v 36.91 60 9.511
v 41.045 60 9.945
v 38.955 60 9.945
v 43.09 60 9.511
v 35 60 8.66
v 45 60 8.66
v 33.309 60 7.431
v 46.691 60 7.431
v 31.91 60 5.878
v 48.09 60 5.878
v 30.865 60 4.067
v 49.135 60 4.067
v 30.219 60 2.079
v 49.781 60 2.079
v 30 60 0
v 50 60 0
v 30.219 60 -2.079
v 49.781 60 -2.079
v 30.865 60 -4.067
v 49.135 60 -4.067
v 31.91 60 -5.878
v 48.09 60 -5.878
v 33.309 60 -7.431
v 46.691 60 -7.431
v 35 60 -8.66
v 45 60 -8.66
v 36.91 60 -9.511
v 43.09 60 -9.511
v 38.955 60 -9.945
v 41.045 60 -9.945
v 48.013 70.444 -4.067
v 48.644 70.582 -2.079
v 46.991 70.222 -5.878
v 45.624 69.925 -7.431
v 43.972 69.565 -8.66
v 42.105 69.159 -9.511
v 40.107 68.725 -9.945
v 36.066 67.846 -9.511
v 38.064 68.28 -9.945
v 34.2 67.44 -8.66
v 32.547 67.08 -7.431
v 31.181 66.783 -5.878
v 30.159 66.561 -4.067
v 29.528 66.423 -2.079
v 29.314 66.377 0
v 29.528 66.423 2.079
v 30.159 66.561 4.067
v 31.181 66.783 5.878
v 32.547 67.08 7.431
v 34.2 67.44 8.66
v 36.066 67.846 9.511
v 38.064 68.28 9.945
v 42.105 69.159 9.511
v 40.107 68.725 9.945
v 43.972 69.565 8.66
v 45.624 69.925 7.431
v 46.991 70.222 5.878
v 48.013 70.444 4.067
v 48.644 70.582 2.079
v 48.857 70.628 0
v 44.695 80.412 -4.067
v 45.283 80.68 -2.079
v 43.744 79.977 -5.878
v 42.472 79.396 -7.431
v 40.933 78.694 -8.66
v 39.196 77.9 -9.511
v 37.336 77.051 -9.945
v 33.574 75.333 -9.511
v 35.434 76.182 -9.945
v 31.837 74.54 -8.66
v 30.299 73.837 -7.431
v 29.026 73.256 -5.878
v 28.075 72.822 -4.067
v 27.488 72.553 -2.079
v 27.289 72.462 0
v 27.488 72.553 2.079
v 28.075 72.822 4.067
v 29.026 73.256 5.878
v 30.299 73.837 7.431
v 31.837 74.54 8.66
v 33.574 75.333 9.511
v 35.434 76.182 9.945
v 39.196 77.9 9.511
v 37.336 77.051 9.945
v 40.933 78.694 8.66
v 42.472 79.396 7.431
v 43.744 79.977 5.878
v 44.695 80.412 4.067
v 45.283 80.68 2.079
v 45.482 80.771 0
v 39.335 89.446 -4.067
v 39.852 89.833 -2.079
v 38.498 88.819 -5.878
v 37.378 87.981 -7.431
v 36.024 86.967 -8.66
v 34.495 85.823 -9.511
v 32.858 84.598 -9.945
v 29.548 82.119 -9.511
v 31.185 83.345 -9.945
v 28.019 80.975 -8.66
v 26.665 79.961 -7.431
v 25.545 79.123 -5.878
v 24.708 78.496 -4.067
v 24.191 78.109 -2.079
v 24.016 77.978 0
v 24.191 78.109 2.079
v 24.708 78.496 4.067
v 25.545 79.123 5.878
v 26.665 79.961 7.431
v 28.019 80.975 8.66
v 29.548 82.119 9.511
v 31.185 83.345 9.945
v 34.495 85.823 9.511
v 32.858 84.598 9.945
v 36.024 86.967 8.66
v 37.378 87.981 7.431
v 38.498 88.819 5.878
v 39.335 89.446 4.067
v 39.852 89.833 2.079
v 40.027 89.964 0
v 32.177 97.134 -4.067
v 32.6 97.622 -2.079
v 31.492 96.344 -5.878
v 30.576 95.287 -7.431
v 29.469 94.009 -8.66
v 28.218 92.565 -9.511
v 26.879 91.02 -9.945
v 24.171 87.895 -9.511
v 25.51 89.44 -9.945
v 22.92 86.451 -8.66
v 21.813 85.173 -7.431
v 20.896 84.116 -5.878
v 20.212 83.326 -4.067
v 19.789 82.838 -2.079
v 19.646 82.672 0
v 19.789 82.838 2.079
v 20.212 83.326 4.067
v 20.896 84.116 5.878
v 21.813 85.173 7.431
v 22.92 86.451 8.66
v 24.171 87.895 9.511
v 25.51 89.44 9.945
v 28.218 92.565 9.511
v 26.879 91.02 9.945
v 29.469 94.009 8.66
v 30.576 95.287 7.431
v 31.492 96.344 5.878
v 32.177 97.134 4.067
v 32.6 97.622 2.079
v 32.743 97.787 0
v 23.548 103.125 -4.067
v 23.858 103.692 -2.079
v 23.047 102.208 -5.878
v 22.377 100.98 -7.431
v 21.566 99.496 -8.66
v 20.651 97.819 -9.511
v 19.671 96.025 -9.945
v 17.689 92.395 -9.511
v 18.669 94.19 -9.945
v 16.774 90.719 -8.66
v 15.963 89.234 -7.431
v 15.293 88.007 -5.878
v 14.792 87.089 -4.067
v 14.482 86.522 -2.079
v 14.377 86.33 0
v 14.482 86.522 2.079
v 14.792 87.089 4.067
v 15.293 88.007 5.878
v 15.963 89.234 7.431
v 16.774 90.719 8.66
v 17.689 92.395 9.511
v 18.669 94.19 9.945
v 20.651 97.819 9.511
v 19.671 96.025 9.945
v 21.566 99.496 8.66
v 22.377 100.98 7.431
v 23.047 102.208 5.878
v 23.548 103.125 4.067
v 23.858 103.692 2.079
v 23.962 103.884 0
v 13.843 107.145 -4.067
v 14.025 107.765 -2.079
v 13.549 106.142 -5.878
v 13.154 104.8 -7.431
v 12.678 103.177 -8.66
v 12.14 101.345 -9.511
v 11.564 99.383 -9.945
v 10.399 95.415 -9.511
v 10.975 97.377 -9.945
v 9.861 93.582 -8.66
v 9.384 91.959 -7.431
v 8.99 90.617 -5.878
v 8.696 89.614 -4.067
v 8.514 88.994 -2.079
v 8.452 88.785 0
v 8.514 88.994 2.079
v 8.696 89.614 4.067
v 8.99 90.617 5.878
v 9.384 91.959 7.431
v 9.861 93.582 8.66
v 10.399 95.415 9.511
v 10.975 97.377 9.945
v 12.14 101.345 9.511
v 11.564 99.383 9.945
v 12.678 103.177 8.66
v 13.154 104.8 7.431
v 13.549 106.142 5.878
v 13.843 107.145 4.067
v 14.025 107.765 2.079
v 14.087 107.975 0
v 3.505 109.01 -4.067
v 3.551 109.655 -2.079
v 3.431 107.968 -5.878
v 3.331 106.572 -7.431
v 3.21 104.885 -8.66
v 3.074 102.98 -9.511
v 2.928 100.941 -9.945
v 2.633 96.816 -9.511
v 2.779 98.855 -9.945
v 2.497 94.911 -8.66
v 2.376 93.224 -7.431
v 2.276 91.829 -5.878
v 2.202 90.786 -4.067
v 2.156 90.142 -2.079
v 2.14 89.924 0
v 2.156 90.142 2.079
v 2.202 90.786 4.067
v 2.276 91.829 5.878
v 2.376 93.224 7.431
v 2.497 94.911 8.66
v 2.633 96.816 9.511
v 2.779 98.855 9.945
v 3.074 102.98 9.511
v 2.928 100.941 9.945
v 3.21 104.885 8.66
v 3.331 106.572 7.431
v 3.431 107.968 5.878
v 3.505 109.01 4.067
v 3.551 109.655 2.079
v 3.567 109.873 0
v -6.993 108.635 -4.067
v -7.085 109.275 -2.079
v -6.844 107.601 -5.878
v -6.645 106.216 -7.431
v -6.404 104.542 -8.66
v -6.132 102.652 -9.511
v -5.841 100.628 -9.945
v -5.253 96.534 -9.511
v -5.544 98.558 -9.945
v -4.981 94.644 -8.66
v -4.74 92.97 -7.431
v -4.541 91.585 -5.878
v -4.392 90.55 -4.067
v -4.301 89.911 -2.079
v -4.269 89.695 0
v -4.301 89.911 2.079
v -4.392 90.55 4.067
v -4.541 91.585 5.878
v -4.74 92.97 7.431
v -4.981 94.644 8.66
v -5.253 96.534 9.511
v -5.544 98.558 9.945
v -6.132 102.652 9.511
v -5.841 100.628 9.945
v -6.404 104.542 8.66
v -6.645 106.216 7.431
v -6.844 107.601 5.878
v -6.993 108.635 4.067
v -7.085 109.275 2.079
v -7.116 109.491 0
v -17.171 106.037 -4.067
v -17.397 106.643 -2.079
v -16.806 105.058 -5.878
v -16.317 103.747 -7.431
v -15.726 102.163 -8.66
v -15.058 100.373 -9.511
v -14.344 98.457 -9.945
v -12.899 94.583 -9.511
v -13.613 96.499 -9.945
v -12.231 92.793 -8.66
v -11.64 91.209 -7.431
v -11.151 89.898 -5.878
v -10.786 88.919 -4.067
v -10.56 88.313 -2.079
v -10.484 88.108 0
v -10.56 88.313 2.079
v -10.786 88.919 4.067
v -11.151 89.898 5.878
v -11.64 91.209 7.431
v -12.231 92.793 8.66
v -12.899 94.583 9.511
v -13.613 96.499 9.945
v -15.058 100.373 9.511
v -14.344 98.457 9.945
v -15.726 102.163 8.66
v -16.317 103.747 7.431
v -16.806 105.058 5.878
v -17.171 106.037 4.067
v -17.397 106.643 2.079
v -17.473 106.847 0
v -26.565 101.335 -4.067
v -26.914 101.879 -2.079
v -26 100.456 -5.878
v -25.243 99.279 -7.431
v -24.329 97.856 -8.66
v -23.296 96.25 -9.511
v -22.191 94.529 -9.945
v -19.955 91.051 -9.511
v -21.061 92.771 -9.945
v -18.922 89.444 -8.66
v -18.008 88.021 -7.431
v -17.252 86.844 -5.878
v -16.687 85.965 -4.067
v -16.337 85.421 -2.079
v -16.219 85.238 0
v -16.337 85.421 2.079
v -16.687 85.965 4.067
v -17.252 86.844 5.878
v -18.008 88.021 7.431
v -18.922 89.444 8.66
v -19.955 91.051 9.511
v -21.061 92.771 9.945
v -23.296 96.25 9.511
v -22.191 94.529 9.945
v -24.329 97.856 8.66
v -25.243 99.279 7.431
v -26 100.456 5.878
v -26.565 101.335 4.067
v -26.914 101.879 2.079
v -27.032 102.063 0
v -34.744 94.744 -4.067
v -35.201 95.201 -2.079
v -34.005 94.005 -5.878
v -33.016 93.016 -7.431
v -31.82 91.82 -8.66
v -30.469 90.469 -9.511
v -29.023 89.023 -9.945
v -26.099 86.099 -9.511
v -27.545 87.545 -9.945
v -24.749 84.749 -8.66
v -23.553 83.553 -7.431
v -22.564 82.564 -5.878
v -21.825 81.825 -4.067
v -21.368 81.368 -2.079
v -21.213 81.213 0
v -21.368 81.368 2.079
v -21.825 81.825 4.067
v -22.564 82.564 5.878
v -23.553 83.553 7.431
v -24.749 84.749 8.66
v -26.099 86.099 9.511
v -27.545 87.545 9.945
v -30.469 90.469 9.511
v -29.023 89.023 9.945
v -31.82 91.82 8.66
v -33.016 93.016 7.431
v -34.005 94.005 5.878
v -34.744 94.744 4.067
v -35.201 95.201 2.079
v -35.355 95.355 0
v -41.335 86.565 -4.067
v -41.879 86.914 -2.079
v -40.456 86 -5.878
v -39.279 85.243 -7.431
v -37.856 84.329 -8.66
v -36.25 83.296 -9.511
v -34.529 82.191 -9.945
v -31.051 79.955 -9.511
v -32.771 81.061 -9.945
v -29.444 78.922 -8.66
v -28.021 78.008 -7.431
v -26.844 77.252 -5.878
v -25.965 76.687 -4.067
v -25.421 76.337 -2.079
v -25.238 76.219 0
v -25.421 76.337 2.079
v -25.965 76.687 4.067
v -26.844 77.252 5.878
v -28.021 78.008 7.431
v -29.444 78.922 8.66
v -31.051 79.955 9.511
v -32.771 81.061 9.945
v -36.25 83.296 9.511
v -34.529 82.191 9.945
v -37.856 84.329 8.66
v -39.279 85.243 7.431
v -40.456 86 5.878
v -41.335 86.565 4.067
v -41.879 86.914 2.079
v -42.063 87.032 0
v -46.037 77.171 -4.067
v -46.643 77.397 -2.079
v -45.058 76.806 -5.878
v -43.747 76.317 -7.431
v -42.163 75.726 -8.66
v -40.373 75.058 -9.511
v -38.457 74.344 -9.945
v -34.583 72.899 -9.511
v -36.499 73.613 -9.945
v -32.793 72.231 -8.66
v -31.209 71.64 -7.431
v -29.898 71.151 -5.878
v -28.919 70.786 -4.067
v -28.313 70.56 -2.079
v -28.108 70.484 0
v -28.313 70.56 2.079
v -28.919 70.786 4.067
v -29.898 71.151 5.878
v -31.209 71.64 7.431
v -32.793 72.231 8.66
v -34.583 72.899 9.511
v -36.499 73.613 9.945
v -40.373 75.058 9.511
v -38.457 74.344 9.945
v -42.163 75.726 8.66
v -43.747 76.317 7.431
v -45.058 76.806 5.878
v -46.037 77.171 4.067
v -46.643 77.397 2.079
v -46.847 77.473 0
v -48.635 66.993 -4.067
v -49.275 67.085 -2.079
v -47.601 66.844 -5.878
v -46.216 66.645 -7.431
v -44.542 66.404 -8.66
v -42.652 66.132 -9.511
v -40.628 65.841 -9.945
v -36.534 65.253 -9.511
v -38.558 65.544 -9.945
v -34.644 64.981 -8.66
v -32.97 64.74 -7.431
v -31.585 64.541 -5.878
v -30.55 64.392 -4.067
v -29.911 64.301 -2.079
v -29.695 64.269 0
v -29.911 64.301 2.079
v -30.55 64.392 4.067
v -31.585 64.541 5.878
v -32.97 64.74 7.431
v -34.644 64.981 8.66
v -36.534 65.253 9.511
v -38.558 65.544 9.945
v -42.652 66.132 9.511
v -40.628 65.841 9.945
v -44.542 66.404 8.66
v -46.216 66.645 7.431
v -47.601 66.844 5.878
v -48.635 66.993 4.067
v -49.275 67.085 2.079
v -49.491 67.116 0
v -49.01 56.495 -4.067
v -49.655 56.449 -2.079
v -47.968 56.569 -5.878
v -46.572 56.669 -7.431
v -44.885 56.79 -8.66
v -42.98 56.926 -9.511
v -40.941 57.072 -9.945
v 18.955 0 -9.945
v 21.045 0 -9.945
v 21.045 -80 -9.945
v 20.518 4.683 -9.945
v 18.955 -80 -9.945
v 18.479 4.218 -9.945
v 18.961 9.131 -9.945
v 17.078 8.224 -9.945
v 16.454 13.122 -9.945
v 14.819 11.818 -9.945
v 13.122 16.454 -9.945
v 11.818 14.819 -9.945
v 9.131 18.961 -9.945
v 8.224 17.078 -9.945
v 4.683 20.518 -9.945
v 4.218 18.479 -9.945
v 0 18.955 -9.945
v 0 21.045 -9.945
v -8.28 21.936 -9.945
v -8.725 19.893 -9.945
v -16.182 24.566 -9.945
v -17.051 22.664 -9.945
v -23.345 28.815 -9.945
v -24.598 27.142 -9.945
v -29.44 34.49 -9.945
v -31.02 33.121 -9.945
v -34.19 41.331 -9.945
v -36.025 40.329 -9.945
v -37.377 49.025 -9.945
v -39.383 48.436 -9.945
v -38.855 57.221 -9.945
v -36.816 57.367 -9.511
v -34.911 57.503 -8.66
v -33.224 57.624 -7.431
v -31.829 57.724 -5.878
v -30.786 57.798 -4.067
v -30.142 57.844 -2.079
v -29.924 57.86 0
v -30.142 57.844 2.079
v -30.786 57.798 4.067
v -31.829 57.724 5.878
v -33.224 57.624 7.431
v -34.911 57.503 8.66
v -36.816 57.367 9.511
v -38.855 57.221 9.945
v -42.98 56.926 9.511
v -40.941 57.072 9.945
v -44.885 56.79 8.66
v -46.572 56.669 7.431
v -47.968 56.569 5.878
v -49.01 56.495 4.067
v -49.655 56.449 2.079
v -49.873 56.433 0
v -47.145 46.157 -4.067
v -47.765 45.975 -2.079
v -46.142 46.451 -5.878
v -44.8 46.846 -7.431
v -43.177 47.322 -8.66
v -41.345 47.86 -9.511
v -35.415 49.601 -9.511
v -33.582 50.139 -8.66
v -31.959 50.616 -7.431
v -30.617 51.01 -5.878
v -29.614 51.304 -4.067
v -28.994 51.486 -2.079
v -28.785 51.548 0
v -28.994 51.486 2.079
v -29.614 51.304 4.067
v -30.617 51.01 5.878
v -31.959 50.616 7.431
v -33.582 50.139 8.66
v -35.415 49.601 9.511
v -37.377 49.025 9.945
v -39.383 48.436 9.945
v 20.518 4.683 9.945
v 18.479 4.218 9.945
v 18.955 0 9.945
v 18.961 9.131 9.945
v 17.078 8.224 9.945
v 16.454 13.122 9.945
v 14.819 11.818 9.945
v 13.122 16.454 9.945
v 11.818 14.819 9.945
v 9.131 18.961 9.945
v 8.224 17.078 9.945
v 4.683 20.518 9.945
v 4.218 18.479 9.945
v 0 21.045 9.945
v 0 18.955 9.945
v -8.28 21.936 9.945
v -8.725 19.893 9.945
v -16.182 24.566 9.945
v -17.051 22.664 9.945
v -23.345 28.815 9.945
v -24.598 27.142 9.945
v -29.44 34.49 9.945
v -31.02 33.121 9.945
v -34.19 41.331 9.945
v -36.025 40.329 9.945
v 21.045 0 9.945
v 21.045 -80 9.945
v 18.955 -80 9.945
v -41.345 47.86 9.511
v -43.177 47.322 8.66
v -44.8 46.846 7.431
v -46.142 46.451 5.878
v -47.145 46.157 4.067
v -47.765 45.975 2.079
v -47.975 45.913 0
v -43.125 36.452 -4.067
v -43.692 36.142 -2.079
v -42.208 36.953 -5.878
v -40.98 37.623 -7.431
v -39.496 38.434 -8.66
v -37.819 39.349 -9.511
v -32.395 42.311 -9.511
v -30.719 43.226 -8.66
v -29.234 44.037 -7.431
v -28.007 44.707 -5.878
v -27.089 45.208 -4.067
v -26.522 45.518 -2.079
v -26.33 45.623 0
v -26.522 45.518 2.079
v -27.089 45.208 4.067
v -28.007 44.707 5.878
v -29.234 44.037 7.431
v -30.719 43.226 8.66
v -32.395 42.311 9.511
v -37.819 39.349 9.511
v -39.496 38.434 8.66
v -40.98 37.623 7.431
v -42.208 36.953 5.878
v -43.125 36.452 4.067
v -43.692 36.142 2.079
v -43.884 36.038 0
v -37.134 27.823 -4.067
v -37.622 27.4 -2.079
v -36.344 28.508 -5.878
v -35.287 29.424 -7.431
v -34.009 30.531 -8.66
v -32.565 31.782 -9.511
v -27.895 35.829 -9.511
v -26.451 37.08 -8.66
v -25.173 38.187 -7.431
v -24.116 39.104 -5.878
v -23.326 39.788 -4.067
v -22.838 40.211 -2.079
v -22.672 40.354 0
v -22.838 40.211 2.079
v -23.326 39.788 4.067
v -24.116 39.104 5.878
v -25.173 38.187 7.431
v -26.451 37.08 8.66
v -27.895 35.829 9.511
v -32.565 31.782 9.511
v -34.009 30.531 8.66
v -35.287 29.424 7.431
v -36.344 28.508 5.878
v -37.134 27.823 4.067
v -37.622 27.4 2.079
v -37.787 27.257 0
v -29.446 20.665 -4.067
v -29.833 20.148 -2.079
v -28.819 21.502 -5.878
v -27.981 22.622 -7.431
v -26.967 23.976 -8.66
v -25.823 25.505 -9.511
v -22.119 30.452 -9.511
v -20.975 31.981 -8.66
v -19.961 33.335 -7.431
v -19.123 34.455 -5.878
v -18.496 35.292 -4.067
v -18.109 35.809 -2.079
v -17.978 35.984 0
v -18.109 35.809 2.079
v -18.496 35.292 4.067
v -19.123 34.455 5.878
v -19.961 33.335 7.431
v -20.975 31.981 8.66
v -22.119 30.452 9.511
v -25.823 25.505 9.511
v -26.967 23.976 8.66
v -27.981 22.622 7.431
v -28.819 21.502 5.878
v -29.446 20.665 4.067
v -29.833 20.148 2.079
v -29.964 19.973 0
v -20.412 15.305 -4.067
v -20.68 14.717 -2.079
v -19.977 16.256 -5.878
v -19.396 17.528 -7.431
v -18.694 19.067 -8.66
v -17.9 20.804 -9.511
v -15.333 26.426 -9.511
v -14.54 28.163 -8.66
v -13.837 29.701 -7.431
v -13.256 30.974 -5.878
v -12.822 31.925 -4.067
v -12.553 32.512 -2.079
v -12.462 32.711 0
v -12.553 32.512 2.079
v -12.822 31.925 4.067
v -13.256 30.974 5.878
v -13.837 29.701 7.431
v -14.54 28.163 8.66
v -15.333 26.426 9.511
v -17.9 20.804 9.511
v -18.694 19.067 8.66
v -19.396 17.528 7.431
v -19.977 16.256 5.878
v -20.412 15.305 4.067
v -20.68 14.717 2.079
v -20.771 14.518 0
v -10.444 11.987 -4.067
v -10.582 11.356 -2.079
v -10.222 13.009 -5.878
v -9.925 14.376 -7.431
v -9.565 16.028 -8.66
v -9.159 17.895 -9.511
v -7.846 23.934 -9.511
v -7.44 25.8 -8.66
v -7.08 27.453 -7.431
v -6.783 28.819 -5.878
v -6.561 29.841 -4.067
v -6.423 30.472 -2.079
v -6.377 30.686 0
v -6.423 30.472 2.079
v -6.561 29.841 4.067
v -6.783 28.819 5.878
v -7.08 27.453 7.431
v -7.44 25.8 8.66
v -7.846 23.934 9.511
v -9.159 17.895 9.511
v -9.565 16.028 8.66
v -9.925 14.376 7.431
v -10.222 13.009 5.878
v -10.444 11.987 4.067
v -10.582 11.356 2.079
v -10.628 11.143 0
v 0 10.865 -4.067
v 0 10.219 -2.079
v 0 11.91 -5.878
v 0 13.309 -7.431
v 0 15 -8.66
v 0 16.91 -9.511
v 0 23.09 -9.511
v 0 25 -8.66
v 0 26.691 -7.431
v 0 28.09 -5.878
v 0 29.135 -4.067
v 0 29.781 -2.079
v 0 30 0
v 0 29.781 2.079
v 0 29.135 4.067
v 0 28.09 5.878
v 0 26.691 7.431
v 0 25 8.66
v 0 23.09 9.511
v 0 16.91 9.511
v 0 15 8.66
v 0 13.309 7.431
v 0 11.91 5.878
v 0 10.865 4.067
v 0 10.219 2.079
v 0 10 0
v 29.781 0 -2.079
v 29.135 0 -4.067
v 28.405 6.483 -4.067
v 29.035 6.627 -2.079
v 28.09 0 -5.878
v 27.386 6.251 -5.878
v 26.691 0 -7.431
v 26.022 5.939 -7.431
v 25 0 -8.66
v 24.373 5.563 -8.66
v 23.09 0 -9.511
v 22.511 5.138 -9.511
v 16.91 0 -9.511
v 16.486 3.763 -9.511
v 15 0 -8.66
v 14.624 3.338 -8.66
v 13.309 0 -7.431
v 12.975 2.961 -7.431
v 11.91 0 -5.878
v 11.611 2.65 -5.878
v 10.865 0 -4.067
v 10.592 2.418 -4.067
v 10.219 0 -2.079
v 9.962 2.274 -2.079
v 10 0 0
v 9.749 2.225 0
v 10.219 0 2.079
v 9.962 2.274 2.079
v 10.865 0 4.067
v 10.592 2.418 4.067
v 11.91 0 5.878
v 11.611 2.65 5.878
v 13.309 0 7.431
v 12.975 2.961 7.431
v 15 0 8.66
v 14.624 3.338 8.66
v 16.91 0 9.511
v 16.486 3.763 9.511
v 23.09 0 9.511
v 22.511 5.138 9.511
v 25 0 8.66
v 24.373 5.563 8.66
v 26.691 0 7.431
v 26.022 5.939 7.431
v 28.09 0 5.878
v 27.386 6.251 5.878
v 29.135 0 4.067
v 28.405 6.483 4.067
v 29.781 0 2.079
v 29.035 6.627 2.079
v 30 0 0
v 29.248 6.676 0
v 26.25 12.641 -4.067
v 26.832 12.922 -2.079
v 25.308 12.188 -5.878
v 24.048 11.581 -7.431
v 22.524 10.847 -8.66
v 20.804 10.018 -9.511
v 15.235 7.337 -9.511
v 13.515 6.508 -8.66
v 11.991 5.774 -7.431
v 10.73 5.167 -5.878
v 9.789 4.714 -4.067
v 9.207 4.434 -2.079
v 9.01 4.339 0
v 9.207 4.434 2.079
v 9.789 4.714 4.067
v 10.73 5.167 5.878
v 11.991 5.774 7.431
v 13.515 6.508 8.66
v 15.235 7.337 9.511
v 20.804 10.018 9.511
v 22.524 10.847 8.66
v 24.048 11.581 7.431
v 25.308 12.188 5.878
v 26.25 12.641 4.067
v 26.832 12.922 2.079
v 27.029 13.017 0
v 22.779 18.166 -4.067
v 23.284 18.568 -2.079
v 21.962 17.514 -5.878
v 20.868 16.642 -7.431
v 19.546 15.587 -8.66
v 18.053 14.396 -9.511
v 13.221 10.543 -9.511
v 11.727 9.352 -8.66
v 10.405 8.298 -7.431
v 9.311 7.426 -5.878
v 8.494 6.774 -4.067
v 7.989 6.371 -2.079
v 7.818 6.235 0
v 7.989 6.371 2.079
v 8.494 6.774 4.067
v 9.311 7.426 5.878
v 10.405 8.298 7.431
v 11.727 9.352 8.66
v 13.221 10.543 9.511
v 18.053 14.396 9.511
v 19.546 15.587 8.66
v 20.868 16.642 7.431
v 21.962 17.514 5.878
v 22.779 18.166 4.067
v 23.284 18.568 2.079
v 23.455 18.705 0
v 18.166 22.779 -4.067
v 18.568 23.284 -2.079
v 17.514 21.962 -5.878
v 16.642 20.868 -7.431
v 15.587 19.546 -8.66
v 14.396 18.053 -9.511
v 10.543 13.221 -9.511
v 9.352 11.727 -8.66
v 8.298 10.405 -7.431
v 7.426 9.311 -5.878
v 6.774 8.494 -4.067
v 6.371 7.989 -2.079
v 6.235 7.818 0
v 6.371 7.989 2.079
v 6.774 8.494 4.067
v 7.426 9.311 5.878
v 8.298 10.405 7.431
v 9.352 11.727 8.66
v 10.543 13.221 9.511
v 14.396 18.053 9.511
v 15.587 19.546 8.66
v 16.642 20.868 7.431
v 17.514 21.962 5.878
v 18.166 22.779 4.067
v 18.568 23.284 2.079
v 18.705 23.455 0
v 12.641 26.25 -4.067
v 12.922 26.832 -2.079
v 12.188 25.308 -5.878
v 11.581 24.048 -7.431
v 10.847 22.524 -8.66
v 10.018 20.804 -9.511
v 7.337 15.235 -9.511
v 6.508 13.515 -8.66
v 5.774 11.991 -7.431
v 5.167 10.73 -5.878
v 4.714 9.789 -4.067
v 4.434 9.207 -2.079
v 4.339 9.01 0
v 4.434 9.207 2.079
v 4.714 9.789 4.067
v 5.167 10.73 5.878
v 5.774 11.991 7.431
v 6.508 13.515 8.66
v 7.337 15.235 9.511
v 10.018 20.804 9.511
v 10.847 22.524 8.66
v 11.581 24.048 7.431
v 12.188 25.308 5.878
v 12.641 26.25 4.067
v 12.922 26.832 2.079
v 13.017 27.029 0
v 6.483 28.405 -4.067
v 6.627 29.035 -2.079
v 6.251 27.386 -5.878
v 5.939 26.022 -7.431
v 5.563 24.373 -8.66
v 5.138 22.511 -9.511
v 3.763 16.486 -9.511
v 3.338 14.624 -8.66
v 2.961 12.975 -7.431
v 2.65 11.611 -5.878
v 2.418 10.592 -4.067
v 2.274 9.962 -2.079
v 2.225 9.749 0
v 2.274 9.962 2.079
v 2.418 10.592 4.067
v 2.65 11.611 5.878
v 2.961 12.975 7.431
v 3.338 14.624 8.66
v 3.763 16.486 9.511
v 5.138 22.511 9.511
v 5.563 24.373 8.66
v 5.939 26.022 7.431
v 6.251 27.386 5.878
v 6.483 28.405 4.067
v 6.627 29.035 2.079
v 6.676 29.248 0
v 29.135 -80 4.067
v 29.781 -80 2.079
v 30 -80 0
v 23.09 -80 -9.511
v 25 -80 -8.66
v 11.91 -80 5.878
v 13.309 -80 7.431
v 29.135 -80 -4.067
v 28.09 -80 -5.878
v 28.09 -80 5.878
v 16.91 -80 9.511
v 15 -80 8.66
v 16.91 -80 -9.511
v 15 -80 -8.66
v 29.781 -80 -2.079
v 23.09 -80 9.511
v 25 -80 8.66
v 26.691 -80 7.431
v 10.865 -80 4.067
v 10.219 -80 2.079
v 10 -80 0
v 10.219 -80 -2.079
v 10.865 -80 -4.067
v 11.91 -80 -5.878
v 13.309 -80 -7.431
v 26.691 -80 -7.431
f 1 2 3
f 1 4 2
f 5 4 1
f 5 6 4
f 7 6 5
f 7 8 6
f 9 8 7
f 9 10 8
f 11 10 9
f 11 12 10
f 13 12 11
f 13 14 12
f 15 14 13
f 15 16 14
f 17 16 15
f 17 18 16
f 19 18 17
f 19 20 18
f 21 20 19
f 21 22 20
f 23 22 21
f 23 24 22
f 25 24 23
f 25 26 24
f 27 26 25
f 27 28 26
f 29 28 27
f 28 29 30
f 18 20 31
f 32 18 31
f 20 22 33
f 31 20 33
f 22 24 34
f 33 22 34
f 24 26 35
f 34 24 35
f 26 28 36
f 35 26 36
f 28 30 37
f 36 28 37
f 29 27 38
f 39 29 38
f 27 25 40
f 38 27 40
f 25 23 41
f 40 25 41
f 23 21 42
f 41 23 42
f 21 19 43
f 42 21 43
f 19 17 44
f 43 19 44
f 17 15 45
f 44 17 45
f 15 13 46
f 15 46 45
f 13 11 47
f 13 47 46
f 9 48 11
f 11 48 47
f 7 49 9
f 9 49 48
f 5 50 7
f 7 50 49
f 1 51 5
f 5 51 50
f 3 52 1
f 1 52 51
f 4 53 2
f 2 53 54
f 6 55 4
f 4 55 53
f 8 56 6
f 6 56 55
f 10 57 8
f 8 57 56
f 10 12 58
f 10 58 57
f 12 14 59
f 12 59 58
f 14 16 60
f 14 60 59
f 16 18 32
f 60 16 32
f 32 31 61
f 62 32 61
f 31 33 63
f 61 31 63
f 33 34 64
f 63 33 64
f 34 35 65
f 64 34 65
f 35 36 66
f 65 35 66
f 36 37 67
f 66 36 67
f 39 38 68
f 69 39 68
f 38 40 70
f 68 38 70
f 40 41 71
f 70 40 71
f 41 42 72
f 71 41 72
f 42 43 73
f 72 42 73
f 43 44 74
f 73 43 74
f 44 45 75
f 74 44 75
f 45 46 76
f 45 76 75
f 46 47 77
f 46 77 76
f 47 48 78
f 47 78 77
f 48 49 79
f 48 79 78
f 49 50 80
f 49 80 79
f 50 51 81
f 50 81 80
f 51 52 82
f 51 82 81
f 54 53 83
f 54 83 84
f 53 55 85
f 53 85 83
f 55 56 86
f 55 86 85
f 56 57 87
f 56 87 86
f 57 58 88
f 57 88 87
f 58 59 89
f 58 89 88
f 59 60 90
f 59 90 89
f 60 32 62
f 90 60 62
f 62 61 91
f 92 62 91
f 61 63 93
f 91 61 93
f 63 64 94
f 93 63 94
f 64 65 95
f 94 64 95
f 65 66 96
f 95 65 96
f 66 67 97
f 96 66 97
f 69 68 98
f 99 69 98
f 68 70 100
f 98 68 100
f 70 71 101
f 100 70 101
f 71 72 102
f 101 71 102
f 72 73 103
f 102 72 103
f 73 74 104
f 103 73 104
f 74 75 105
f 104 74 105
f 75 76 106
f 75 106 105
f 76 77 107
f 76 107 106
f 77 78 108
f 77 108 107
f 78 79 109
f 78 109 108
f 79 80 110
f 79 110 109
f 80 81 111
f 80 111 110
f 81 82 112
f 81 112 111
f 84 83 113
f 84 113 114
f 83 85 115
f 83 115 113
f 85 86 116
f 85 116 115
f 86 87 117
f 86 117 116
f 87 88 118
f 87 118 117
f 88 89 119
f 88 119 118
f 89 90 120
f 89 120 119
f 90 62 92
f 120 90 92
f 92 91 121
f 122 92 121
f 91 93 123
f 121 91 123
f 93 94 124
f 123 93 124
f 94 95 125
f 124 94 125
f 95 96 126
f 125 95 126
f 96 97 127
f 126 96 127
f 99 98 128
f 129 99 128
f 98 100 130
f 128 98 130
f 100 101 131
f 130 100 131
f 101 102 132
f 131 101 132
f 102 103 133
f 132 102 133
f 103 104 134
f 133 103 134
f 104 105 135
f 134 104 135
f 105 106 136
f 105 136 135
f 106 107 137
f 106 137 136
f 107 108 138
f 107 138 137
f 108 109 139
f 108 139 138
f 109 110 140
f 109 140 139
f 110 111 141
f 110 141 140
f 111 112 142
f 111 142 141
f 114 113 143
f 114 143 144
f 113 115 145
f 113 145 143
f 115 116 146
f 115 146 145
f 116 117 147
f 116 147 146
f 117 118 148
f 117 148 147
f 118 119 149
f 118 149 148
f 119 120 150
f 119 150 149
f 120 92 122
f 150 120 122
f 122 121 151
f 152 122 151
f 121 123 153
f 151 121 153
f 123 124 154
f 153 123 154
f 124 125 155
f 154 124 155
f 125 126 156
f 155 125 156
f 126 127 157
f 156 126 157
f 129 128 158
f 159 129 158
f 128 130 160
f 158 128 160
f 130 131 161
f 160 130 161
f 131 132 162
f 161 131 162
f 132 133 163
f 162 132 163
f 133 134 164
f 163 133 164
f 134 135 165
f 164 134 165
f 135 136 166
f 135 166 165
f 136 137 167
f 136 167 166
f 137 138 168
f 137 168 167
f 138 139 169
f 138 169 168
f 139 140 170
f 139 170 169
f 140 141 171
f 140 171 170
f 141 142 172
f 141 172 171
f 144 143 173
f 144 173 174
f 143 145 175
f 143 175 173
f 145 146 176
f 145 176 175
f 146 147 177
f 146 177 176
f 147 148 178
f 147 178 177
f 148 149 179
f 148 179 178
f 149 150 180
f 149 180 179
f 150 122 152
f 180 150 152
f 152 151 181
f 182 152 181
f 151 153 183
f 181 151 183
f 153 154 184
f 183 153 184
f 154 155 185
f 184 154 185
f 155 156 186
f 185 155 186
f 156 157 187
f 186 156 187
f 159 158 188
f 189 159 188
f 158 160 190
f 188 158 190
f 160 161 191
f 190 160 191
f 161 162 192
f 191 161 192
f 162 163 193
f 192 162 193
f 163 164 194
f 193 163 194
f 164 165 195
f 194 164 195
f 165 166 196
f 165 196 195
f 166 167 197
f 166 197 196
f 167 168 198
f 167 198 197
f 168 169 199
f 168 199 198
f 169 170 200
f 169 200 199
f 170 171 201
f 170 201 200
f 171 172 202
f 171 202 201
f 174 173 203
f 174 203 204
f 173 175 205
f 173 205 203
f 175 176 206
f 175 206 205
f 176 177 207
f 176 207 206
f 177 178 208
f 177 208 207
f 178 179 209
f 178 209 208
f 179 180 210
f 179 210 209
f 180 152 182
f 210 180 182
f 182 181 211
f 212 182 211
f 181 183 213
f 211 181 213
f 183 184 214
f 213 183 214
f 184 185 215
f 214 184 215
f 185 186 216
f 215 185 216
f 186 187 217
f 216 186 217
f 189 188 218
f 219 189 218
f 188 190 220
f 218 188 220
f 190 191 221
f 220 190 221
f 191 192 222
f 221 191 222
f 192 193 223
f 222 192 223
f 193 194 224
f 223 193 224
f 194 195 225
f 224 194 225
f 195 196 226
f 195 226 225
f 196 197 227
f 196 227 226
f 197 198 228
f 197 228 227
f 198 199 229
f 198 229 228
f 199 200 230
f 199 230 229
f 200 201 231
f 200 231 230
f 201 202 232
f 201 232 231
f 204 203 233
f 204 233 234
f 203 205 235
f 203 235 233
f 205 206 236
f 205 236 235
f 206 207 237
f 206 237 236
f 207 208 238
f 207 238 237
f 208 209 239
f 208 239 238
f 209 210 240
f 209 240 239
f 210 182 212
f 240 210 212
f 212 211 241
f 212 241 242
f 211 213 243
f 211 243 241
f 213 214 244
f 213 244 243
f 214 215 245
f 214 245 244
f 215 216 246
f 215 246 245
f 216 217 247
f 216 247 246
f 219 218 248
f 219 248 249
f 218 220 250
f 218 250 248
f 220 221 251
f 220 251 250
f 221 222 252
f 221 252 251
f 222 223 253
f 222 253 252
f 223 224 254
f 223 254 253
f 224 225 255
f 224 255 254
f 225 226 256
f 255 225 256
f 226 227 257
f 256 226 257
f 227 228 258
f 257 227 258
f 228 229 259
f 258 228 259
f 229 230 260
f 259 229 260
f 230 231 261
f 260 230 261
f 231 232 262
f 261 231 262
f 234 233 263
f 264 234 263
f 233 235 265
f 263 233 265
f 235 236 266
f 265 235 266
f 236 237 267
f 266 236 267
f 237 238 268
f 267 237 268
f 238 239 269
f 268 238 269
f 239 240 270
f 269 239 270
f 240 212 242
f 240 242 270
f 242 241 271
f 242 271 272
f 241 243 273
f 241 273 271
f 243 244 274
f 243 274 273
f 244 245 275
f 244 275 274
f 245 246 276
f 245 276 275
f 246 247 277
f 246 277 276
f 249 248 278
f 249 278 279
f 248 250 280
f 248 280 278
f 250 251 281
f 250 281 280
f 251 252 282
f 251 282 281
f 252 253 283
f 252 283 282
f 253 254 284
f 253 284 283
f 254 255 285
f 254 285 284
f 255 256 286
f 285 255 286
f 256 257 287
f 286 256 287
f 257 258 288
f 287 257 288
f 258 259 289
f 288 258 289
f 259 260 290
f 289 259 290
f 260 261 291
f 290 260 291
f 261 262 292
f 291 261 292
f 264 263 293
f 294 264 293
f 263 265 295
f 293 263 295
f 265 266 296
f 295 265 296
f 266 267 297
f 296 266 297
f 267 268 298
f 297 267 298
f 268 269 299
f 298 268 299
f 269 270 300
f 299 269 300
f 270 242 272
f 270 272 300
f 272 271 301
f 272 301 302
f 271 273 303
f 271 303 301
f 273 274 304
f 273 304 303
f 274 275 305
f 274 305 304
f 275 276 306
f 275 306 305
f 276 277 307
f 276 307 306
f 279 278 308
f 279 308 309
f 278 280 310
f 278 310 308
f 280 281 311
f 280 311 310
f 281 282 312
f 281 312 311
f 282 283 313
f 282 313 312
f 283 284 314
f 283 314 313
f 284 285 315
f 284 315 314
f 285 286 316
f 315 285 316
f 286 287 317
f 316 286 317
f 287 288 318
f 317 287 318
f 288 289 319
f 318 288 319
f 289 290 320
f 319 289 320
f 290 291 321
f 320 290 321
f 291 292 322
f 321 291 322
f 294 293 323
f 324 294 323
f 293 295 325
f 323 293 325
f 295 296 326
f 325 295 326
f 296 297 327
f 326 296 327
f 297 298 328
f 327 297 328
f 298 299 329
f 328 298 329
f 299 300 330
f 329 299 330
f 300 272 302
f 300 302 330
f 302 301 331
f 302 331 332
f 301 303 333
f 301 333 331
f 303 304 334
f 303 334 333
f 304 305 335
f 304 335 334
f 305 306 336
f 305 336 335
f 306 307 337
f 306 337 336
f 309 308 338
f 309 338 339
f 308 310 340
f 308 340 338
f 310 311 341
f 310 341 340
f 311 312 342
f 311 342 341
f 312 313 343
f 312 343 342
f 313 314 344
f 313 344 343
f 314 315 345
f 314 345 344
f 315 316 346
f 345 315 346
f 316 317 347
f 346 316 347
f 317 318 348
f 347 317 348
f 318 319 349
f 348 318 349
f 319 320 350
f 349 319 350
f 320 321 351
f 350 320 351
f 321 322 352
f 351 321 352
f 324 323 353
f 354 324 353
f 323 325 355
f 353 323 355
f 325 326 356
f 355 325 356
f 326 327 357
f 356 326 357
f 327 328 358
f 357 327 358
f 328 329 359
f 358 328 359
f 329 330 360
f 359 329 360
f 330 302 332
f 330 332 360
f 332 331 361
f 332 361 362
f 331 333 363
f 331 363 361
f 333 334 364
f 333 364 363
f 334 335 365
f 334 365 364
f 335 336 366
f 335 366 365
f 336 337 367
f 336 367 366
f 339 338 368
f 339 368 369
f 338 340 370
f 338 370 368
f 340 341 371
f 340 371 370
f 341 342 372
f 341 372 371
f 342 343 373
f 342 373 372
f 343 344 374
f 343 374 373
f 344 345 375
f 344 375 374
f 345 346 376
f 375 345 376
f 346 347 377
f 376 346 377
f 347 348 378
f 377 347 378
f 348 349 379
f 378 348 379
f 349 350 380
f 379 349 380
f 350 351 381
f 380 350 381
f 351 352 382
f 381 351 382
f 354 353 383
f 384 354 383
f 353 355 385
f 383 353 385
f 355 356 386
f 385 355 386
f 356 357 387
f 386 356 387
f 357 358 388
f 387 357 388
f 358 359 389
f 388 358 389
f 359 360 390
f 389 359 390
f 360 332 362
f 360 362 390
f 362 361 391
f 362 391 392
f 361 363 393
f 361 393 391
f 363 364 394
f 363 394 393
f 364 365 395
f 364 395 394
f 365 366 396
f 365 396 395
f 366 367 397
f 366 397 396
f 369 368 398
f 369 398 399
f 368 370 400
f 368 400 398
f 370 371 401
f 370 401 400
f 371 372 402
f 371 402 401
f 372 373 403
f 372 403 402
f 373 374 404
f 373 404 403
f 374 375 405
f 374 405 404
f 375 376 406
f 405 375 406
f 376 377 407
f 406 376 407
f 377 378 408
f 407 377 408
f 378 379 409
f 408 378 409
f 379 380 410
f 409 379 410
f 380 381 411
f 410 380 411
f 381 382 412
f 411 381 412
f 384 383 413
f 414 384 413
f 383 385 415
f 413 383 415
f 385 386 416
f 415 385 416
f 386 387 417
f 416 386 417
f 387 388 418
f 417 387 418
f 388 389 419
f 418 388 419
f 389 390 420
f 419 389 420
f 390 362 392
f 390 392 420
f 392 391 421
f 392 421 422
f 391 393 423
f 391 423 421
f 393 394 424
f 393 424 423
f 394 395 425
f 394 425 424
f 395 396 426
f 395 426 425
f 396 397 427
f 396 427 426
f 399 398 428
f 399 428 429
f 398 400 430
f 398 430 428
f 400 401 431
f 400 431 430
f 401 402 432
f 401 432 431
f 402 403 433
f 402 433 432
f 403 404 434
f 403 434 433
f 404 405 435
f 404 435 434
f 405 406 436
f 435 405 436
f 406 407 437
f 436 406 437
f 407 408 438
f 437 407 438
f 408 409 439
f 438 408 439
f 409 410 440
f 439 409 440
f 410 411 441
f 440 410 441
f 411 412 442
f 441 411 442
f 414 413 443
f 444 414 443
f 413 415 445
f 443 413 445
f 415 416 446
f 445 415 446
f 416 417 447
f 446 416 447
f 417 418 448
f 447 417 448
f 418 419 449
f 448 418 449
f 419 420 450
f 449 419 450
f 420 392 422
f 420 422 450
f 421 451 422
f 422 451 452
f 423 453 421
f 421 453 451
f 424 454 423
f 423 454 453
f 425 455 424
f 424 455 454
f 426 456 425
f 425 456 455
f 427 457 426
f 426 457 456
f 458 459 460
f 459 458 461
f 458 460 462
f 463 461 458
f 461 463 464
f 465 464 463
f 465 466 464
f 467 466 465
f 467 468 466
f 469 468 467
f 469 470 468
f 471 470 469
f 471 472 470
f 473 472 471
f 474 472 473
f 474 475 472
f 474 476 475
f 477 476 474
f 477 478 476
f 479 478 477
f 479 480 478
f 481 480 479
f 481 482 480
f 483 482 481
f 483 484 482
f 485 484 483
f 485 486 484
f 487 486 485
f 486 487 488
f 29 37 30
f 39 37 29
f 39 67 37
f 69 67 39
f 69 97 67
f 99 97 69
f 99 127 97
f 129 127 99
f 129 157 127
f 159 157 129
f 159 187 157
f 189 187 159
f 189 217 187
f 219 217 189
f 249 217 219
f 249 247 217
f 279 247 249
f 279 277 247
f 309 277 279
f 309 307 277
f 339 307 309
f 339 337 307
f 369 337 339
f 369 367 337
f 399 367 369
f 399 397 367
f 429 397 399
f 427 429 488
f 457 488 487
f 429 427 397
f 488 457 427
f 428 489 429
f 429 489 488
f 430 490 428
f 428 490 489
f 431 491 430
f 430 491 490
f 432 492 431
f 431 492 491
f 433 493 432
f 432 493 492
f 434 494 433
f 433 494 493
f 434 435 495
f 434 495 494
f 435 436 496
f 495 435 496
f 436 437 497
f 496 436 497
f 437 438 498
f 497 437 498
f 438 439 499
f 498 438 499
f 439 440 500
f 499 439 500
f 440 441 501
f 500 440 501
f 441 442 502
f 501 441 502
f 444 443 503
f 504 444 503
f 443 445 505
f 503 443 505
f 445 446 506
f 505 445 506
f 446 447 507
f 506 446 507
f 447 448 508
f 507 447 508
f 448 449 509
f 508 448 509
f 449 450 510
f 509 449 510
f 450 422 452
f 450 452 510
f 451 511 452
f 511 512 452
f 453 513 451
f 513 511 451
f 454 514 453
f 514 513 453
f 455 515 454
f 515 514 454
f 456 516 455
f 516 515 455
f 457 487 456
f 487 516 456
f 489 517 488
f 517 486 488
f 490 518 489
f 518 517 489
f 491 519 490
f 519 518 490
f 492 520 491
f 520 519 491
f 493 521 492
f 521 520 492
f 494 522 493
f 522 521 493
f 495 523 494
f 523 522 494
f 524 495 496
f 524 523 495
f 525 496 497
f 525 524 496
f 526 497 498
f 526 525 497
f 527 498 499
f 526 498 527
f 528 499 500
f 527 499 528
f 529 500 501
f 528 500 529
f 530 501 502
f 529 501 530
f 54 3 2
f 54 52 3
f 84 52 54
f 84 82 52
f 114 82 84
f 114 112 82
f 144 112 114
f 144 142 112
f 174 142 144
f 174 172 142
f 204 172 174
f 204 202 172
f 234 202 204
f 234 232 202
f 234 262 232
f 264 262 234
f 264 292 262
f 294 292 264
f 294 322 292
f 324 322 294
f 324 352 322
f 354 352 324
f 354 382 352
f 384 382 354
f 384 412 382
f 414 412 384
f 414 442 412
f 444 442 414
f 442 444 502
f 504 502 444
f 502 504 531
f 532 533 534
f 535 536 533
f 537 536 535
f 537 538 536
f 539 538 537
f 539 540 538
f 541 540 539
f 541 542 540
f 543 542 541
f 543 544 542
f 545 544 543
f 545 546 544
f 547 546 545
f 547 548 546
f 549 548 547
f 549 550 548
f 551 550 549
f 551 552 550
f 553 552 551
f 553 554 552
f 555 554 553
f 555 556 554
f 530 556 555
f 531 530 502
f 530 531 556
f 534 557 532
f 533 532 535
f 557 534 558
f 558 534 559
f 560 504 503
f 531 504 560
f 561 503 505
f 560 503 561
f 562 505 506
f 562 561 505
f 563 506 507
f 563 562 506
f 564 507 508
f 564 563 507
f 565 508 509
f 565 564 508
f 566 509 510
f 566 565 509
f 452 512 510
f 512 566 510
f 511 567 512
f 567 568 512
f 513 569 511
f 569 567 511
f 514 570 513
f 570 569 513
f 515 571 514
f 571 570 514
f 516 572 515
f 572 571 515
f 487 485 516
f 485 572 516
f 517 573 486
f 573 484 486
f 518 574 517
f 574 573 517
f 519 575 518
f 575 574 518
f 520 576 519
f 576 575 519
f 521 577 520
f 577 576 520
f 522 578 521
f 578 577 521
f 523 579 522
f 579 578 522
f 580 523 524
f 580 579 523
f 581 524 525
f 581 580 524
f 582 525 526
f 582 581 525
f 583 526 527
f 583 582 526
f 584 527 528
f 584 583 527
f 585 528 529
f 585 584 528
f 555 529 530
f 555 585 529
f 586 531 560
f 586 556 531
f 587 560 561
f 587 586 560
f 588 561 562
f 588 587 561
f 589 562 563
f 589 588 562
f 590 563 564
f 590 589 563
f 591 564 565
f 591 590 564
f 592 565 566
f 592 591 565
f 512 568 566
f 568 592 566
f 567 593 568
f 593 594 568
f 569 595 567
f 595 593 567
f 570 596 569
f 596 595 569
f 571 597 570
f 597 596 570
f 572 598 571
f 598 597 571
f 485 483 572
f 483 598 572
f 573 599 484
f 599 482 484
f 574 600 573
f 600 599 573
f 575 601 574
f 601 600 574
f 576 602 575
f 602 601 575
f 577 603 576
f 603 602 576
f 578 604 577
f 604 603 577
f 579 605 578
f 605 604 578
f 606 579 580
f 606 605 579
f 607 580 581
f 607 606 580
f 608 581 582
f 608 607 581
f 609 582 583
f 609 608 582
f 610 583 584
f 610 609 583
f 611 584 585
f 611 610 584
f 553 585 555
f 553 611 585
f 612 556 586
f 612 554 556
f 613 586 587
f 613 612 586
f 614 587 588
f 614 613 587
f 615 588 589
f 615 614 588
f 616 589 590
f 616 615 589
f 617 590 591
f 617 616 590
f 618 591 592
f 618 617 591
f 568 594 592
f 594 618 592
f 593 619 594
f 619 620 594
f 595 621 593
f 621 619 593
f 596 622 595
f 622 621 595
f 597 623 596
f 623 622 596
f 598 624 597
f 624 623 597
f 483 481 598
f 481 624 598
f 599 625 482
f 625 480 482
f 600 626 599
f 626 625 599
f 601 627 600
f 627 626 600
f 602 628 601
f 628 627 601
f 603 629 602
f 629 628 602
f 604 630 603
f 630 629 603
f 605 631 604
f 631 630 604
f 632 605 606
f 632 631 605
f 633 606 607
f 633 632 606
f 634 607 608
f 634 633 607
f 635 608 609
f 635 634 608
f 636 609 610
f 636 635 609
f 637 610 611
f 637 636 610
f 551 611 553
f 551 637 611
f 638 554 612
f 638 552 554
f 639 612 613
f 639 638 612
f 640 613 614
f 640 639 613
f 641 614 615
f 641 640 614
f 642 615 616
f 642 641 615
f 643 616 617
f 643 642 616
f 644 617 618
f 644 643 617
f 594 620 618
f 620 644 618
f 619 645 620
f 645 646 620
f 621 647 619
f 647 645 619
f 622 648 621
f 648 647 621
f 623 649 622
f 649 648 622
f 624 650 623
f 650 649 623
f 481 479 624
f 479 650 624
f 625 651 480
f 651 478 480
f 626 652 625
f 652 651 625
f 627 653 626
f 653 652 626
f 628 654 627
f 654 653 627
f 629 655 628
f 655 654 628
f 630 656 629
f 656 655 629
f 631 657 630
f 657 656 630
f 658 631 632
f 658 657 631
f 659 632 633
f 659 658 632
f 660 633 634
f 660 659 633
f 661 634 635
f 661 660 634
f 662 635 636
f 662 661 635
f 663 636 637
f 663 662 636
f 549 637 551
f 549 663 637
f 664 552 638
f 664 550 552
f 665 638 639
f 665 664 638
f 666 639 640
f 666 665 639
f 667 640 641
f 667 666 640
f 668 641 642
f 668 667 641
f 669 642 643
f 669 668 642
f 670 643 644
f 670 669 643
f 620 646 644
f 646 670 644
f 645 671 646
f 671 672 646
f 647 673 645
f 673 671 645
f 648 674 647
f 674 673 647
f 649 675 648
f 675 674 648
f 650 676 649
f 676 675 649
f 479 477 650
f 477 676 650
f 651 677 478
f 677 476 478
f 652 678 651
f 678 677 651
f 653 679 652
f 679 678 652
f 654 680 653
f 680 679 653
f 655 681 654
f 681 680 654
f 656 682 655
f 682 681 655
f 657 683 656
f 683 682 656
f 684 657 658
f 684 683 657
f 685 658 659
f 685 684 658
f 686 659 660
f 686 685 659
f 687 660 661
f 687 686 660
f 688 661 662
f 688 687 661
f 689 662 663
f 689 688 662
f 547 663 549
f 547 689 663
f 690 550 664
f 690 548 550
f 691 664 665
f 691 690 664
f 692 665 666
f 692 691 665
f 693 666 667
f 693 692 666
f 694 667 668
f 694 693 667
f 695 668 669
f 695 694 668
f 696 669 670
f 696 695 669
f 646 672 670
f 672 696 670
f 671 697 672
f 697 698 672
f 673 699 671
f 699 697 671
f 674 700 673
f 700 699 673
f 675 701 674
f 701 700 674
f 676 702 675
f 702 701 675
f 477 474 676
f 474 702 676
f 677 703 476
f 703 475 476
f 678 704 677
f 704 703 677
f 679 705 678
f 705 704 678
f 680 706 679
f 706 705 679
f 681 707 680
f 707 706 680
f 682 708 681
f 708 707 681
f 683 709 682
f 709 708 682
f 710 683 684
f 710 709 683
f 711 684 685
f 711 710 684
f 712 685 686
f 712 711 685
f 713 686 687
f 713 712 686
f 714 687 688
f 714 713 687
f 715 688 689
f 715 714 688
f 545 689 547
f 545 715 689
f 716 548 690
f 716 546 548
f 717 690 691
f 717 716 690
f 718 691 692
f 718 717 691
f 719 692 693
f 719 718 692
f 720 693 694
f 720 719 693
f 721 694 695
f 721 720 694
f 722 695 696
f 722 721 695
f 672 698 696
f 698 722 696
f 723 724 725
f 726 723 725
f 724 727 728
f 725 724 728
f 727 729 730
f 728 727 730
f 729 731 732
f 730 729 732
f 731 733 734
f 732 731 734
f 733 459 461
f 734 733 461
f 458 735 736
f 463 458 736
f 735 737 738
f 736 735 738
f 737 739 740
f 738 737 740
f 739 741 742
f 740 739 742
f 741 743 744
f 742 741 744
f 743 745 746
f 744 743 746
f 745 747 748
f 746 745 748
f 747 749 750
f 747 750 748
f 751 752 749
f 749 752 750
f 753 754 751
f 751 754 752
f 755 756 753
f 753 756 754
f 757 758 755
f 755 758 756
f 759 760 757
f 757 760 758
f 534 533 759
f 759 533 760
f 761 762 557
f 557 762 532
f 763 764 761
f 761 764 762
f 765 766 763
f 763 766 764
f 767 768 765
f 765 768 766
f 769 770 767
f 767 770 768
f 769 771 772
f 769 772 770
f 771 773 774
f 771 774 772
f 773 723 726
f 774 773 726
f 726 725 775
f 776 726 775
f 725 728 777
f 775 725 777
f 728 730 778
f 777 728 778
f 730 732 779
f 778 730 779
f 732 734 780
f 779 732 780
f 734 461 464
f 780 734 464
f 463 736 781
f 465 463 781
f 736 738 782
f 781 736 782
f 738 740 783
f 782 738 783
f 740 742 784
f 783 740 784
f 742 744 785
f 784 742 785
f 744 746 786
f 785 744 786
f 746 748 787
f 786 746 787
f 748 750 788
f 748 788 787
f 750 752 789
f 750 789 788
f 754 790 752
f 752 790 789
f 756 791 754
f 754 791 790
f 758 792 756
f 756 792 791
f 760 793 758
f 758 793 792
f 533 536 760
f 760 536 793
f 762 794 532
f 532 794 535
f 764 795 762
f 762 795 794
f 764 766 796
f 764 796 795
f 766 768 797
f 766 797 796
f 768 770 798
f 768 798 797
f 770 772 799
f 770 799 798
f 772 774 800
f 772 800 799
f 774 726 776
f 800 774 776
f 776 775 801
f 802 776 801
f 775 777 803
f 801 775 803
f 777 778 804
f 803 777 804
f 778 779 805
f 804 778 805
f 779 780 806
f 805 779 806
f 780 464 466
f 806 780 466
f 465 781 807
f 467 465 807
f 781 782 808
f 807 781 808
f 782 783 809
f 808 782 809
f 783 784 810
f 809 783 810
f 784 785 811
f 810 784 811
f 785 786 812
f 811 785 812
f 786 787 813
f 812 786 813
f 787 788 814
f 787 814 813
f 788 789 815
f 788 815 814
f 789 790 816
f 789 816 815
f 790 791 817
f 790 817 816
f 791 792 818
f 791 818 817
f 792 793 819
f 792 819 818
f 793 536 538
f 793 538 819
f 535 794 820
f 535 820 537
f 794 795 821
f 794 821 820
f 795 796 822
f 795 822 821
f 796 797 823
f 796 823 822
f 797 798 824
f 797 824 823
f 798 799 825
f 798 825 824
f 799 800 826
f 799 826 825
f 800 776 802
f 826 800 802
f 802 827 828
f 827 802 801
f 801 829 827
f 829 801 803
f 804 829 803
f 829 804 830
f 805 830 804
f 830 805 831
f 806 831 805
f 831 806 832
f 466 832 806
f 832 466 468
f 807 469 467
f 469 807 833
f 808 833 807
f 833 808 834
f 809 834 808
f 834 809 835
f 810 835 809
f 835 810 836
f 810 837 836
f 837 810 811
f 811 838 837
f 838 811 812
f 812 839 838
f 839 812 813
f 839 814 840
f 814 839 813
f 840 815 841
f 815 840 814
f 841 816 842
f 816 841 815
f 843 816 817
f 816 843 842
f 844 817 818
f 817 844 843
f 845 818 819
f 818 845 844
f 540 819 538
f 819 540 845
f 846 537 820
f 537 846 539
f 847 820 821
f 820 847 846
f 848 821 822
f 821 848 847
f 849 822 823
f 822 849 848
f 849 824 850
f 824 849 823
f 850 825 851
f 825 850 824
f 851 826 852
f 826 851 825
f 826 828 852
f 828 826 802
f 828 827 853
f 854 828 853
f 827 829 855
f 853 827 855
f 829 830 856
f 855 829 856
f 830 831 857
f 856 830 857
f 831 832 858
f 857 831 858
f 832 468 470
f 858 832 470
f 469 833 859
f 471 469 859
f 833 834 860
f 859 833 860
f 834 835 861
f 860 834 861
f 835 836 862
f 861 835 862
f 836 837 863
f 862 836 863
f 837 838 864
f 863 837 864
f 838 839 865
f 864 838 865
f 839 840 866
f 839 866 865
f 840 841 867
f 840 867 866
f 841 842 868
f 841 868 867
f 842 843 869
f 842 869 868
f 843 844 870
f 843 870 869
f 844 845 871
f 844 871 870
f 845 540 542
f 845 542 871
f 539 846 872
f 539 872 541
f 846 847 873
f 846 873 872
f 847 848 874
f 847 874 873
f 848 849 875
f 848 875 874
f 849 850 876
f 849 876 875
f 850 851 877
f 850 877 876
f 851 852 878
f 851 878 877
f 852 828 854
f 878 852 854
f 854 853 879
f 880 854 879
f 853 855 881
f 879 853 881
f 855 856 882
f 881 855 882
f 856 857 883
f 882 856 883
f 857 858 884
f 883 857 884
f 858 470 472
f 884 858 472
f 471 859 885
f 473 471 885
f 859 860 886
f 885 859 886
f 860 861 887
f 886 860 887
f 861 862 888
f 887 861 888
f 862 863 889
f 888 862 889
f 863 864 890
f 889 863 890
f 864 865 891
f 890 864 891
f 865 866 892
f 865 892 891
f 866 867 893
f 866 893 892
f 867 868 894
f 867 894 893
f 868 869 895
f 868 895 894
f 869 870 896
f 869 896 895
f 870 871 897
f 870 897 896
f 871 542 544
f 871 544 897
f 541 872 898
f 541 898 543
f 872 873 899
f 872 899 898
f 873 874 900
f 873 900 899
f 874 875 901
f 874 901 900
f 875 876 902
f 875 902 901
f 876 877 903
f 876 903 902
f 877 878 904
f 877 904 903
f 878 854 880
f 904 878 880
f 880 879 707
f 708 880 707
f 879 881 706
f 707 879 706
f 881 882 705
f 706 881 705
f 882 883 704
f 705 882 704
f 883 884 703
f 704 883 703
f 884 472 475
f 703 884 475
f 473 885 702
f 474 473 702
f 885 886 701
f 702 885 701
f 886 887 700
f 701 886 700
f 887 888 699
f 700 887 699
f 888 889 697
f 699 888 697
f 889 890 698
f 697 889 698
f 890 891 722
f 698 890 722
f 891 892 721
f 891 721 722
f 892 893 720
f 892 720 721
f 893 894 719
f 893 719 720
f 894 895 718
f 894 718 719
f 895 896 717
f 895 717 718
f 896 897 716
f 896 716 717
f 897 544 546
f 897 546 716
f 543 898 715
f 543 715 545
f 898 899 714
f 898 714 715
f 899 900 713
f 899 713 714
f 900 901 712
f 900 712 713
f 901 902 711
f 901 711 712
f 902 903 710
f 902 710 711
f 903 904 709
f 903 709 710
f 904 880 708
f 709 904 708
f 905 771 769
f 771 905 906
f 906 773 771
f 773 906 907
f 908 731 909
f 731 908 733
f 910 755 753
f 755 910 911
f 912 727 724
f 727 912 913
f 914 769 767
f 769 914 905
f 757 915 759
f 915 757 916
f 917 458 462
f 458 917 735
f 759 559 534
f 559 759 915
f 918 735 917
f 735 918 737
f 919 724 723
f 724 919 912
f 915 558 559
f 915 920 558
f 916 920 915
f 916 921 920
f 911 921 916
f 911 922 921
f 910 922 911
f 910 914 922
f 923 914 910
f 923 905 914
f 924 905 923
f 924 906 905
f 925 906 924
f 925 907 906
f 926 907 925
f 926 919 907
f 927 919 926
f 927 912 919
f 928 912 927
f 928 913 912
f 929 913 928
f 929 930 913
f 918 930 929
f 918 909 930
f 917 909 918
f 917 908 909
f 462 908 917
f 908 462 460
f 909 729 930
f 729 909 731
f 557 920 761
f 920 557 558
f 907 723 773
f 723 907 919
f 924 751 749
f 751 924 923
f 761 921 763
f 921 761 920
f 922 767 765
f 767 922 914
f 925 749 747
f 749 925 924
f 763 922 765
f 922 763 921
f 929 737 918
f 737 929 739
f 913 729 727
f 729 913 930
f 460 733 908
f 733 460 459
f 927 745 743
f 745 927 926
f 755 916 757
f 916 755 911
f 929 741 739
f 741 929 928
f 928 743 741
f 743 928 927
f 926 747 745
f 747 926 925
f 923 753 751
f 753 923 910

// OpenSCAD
translate([0,60,0])
   rotate_extrude(angle=270, convexity=10)
       translate([40, 0]) circle(10);
rotate_extrude(angle=90, convexity=10)
   translate([20, 0]) circle(10);
translate([20,0,0])
   rotate([90,0,0]) cylinder(r=10,h=80);
